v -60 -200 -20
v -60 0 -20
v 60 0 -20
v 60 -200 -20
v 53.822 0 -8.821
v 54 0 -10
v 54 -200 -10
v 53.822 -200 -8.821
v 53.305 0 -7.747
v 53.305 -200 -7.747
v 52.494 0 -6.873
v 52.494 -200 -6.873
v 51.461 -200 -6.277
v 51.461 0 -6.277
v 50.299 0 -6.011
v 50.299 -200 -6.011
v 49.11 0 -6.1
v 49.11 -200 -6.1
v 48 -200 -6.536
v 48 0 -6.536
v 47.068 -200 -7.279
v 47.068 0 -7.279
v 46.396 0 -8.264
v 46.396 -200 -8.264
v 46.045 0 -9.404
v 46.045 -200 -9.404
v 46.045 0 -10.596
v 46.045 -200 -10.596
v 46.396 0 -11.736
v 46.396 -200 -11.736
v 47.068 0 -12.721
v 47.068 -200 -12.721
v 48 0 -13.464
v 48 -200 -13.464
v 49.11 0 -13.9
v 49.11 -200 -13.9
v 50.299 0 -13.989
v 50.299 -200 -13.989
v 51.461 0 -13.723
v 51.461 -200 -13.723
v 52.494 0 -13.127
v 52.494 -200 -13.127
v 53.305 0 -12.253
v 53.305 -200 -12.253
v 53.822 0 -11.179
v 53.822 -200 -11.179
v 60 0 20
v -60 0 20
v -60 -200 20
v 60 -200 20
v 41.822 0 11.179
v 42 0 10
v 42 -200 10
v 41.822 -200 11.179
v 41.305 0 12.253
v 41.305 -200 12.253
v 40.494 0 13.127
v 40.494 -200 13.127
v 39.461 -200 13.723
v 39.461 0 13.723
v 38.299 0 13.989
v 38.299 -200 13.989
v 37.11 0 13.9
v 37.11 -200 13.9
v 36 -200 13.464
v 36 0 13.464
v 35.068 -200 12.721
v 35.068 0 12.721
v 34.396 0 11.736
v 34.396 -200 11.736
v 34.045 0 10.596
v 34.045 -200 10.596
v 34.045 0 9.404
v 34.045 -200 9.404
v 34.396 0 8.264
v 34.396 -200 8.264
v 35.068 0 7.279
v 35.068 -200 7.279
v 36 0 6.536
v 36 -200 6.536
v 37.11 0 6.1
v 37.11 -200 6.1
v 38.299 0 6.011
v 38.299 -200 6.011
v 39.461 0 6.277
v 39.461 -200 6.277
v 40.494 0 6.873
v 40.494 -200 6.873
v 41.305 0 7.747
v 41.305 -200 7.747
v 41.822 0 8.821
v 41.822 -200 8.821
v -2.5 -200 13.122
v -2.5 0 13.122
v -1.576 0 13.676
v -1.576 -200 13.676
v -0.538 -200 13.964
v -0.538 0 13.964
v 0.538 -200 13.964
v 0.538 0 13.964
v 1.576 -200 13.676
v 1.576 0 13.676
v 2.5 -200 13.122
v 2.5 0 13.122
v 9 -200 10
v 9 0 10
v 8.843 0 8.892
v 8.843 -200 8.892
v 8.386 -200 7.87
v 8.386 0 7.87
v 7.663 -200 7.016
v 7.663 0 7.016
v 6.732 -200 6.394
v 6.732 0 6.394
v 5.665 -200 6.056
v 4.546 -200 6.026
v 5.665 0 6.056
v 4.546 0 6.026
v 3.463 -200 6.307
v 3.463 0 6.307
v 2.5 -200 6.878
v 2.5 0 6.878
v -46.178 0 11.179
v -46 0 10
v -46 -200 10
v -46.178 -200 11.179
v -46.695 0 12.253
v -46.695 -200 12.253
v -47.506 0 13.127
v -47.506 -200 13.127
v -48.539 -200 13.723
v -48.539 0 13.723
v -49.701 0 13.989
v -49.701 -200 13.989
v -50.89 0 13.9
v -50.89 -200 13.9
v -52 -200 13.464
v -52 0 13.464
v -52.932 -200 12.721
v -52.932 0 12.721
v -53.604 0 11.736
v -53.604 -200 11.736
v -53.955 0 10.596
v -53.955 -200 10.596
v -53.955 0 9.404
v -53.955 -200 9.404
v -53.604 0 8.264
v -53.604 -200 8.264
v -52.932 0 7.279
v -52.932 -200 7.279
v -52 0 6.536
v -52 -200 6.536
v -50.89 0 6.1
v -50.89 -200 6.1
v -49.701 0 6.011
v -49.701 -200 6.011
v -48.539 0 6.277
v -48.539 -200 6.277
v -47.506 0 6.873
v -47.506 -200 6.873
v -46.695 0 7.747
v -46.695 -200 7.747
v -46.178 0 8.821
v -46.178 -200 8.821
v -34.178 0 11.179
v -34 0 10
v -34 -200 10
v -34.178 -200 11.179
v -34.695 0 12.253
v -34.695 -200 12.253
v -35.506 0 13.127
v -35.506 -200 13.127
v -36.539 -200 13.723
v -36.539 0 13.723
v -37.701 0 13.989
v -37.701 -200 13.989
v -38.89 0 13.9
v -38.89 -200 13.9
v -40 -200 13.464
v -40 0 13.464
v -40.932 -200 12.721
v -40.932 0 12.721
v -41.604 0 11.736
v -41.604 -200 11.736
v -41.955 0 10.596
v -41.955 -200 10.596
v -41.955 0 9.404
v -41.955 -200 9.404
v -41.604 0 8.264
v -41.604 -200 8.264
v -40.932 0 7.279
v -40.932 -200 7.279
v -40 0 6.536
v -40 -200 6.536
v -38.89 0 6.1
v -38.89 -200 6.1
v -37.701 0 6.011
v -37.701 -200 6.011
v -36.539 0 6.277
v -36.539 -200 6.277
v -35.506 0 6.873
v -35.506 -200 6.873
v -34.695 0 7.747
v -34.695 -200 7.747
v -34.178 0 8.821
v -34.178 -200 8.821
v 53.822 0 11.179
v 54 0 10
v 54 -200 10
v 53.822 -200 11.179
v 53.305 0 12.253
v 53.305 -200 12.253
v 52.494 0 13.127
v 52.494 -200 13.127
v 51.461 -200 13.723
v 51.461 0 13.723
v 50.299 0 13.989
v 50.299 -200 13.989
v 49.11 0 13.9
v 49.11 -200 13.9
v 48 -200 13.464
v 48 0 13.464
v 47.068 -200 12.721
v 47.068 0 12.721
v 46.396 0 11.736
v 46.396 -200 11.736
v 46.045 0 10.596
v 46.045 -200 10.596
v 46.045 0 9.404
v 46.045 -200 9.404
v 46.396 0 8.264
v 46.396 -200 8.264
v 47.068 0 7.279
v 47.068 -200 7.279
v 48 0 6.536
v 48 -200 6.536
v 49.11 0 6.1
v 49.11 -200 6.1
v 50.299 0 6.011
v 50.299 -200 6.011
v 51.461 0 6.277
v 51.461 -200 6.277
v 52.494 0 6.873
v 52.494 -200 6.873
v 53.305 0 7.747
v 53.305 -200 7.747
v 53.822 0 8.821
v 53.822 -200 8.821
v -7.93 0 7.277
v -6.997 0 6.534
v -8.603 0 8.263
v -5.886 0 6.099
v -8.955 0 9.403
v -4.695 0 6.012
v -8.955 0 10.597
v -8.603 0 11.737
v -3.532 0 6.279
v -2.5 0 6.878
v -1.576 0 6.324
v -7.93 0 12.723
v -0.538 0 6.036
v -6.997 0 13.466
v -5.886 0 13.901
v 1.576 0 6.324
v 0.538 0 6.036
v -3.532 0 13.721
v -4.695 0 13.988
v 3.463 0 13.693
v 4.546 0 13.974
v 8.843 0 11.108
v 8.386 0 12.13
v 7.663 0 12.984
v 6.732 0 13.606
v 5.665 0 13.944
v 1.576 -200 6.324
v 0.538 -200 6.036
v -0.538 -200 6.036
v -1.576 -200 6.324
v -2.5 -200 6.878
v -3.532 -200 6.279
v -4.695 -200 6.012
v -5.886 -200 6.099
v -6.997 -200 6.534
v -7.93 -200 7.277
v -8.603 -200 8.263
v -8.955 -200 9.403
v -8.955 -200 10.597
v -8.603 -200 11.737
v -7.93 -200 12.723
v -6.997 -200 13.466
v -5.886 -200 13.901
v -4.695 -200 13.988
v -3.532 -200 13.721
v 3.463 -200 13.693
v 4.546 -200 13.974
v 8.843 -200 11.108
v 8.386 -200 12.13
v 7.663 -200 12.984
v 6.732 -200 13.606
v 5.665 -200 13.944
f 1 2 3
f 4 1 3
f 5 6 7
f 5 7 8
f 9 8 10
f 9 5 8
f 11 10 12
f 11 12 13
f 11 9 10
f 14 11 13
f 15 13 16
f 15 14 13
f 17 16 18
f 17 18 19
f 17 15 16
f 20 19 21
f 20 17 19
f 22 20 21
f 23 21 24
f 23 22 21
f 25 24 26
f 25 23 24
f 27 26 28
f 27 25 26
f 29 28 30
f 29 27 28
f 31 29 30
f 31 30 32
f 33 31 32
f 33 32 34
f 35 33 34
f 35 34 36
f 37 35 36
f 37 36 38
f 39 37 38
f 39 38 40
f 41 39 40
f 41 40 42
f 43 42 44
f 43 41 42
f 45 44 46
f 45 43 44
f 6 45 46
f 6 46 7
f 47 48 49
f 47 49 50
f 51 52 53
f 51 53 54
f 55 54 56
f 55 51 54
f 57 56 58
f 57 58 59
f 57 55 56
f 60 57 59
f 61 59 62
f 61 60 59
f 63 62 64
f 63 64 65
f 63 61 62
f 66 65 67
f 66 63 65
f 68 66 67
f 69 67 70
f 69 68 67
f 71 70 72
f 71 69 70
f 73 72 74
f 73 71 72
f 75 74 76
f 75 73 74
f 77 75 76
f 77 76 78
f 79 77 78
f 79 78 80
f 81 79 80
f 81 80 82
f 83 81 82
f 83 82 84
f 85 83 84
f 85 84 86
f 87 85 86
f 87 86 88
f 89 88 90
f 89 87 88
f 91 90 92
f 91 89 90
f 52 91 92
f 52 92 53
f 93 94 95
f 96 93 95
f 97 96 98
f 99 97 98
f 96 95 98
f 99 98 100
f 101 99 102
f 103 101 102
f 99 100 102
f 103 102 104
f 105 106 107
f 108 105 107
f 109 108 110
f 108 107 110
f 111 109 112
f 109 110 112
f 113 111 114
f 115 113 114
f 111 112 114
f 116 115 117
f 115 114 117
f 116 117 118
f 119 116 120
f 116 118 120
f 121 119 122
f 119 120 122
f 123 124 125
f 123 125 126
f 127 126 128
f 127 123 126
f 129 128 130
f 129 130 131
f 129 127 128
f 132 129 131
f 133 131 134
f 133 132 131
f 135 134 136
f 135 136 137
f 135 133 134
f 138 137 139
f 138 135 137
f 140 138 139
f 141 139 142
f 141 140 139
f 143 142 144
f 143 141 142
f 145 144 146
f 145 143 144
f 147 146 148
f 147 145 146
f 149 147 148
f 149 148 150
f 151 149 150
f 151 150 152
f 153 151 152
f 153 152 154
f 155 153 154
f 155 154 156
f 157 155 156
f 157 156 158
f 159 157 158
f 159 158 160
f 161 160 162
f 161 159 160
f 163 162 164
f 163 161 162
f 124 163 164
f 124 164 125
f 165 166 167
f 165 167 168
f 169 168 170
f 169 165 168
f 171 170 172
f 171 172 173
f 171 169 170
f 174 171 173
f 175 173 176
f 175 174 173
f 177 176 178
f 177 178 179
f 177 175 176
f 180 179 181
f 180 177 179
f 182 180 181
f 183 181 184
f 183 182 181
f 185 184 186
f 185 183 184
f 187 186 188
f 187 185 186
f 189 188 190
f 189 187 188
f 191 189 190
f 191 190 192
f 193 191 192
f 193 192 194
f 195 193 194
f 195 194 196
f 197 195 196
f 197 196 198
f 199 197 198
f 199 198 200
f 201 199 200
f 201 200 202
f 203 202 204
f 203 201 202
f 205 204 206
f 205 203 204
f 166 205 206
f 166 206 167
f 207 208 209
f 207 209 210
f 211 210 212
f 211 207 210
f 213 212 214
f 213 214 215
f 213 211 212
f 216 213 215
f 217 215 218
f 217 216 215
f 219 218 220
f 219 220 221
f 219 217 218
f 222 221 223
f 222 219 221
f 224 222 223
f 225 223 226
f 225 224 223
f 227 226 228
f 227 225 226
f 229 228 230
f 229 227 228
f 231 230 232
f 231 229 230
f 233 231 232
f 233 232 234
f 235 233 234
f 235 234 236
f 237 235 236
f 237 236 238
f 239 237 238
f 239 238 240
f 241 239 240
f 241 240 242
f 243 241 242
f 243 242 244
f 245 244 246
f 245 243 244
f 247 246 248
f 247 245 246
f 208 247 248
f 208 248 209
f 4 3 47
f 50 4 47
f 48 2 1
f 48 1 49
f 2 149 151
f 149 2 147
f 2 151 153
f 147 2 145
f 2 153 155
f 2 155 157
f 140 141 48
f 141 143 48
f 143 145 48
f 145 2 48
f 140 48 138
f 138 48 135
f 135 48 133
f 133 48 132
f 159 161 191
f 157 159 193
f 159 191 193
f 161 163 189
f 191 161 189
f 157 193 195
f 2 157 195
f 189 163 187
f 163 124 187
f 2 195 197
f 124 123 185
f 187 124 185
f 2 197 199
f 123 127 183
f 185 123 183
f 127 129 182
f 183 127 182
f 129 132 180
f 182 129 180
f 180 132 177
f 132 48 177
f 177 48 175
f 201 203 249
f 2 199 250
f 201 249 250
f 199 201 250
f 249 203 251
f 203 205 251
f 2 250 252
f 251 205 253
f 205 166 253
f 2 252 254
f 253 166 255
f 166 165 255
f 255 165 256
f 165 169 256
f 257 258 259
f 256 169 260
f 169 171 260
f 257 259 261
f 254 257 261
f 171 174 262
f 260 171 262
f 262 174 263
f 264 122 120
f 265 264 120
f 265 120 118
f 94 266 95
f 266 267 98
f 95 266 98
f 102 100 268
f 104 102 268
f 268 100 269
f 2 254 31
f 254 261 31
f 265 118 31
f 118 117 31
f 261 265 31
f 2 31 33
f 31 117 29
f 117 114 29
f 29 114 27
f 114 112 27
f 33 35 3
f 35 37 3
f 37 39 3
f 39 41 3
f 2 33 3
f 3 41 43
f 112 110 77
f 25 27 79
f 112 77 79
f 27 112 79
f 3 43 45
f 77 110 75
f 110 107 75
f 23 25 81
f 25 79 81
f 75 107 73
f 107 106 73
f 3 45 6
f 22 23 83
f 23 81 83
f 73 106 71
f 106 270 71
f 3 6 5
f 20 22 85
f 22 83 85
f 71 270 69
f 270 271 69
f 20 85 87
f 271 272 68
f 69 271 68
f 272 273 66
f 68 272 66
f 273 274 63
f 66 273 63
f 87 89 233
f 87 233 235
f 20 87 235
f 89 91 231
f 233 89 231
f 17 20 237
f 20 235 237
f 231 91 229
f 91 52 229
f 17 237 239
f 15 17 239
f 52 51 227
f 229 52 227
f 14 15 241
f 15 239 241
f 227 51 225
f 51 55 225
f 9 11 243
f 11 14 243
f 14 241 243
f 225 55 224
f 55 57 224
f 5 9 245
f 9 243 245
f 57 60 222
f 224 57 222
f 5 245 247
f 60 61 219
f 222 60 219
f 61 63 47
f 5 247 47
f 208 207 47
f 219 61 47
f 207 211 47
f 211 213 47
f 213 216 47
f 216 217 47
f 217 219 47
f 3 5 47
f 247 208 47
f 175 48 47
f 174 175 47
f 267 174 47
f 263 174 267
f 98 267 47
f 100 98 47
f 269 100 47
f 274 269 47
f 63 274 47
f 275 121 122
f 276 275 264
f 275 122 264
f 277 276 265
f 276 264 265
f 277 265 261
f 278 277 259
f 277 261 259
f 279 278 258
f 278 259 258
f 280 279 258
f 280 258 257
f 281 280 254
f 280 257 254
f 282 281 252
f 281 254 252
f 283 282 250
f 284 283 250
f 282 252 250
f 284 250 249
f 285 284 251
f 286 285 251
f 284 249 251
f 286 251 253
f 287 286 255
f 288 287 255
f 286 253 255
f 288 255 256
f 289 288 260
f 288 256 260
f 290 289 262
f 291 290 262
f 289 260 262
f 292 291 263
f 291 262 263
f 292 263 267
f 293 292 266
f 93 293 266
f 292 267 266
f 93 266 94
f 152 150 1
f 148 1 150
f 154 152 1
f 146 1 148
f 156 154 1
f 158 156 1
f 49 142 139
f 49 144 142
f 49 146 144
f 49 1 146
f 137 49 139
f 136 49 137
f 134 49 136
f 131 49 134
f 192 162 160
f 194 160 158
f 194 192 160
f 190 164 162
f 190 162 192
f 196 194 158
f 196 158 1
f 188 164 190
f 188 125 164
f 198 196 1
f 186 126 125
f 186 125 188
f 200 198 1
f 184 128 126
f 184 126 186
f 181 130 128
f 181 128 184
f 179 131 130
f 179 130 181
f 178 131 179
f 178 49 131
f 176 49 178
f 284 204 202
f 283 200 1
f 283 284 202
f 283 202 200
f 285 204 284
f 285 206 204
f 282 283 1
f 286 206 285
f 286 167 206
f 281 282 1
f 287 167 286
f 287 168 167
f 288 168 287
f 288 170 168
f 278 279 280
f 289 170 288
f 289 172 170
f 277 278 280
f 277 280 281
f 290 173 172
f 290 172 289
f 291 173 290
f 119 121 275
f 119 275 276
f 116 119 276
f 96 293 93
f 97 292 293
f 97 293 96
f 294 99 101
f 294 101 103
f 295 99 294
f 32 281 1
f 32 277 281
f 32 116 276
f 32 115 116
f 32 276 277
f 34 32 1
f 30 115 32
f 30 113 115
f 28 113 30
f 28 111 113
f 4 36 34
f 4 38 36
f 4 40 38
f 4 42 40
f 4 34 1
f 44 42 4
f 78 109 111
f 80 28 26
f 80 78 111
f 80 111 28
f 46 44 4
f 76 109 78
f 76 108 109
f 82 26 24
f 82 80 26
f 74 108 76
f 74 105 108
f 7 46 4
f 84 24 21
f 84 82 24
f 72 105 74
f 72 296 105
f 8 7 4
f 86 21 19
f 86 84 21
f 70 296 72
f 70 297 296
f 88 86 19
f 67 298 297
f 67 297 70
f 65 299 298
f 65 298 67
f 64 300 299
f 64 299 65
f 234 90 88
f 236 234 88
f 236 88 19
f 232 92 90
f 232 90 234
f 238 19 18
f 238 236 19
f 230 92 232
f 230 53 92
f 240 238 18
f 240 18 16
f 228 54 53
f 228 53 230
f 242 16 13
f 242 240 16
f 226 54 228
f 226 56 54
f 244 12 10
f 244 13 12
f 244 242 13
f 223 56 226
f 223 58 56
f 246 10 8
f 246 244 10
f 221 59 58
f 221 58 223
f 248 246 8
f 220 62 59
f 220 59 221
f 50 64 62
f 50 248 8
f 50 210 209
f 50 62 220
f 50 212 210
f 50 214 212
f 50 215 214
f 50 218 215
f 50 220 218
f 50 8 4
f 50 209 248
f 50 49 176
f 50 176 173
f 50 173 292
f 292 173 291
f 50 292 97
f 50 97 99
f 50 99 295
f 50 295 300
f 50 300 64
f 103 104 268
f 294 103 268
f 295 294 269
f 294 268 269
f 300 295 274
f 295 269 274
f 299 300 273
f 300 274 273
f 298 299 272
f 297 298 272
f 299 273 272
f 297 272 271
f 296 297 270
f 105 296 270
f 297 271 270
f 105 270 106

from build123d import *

# Parameters (mm, degrees)
F0_W     = 120
F0_H     = 40
F0_R     = 4
F1_DEPTH = 200


with BuildPart() as f1:
    # F0 (on Front) → F1 (new body)
    with BuildSketch(Plane.XZ):
        Rectangle(F0_W, F0_H)
        with Locations((50, -10)):
            Circle(F0_R, mode=Mode.SUBTRACT)
        with Locations((-50, 10)):
            Circle(F0_R, mode=Mode.SUBTRACT)
        with Locations((-38, 10)):
            Circle(F0_R, mode=Mode.SUBTRACT)
        with BuildLine():
            ThreePointArc((2.5, 13.122499), (6.732051, 13.605551), (9, 10))
            ThreePointArc((9, 10), (6.732051, 6.394449), (2.5, 6.877501))
            ThreePointArc((2.5, 6.877501), (0, 6), (-2.5, 6.877501))
            ThreePointArc((-2.5, 6.877501), (-9, 10), (-2.5, 13.122499))
            ThreePointArc((-2.5, 13.122499), (0, 14), (2.5, 13.122499))
        make_face(mode=Mode.SUBTRACT)
        with Locations((38, 10)):
            Circle(F0_R, mode=Mode.SUBTRACT)
        with Locations((50, 10)):
            Circle(F0_R, mode=Mode.SUBTRACT)
    extrude(amount=F1_DEPTH)


solid = f1.part
